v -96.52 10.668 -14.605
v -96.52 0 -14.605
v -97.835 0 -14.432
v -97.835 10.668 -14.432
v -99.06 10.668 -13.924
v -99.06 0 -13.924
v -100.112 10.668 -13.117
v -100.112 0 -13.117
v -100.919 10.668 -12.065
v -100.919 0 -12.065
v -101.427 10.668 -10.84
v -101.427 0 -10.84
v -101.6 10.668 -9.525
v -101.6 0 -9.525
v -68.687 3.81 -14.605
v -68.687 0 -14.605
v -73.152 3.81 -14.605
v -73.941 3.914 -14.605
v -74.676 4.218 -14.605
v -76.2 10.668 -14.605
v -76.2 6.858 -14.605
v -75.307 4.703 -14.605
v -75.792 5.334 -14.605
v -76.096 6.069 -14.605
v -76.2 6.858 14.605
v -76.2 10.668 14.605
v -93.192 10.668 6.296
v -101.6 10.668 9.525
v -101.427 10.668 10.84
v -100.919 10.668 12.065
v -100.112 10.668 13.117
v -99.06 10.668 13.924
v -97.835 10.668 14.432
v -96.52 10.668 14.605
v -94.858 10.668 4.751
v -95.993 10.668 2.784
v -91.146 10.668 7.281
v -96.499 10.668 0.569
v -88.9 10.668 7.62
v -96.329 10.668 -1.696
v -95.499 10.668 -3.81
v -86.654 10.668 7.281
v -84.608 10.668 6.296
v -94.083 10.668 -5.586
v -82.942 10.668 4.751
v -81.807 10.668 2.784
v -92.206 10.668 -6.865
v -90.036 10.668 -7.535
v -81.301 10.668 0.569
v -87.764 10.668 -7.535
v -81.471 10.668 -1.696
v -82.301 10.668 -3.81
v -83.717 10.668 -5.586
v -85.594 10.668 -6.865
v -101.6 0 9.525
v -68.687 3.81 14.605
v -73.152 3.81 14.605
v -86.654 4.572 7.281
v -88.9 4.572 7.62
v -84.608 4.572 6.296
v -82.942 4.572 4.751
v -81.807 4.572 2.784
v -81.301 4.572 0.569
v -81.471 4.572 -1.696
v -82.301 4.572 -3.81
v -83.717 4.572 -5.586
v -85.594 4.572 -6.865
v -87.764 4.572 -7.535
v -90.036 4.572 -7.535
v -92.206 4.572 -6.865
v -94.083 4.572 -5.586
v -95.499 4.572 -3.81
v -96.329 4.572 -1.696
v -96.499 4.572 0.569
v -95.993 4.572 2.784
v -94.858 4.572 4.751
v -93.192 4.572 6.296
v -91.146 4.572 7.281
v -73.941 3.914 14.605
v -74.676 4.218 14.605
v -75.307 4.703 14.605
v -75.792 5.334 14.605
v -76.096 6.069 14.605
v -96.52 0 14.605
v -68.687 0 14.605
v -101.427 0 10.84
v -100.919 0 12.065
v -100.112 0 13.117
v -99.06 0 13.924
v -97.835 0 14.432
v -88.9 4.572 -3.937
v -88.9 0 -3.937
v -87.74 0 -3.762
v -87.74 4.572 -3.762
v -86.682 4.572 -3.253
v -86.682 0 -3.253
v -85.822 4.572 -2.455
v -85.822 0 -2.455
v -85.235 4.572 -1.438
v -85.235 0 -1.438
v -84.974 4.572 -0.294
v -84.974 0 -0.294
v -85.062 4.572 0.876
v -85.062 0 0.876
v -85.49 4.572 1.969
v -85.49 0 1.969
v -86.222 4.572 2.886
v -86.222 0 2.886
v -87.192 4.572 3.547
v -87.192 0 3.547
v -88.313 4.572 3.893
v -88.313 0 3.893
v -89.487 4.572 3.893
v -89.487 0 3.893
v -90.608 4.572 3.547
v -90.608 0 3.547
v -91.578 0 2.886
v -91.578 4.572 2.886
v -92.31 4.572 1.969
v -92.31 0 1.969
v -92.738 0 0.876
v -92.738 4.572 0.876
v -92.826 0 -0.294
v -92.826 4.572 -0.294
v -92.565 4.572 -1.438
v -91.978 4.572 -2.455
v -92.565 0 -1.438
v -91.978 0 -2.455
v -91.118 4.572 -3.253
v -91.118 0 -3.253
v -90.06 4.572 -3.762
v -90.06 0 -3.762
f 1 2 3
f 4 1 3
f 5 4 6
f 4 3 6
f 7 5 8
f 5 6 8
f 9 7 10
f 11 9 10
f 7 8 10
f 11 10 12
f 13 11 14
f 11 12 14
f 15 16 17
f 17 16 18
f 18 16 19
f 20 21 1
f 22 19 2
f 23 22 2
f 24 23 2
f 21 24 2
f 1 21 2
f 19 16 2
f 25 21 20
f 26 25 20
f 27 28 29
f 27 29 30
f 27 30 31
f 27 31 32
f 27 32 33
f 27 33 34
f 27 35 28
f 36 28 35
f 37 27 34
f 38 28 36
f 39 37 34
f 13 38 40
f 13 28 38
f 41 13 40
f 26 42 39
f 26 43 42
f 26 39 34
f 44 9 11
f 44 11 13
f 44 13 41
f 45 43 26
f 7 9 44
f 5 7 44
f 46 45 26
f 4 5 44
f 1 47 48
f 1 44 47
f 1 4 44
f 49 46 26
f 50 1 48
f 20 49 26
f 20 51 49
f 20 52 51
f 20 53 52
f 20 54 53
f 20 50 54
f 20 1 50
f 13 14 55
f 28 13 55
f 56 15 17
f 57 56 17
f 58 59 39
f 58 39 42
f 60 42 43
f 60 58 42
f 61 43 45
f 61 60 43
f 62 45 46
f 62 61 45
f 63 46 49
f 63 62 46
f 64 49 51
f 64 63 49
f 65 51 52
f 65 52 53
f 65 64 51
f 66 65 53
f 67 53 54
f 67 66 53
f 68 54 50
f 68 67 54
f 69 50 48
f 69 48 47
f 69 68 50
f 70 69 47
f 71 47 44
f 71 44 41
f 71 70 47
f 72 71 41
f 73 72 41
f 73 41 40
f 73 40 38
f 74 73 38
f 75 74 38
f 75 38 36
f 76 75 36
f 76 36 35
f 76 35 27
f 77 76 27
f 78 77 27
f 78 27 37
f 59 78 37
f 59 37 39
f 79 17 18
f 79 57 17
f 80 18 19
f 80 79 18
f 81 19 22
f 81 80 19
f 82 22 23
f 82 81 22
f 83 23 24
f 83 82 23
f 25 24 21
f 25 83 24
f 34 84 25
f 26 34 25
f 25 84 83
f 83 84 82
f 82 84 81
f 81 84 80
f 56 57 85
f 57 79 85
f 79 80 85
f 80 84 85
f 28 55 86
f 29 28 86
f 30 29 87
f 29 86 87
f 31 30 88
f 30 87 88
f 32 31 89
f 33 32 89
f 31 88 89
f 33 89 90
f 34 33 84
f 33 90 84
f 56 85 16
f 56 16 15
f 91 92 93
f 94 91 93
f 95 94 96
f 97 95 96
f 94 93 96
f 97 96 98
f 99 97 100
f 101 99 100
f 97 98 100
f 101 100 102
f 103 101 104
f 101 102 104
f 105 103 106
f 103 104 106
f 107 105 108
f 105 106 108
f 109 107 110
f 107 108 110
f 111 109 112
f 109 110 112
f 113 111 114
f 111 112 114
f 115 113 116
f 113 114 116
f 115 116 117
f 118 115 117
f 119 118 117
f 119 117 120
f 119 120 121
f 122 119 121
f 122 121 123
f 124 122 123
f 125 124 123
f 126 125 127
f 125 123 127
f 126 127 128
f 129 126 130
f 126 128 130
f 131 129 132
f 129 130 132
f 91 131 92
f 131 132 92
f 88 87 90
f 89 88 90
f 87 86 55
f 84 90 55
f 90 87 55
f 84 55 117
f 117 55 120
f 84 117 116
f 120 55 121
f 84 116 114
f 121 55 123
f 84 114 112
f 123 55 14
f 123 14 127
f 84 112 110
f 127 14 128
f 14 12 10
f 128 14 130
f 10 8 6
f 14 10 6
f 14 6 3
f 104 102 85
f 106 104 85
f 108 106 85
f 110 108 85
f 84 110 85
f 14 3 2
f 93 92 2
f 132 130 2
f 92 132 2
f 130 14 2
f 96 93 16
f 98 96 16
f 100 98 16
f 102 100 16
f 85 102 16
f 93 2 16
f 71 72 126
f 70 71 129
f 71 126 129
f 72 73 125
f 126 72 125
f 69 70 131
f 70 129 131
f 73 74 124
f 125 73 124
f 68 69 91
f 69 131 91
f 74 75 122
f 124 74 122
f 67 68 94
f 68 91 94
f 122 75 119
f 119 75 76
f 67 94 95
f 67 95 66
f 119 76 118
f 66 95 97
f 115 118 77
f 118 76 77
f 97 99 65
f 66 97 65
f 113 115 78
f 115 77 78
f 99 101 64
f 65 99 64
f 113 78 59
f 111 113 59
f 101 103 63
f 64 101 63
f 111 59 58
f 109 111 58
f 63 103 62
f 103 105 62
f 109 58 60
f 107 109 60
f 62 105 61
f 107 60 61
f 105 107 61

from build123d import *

# Parameters (mm, degrees)
SKETCH1_R                = 13.97
SKETCH1_R_2              = 1.275
BOSS_EXTRUDE1_DEPTH      = 3.048
BOSS_EXTRUDE2_DEPTH      = 7.62
BOSS_EXTRUDE2_DEPTH_BACK = 3.048
SKETCH2_R                = 7.62
SKETCH2_R_2              = 1.275
CUT_EXTRUDE2_DEPTH       = 107.252483849
SKETCH6_R                = 8.89
SKETCH6_R_2              = 3.937
BOSS_EXTRUDE3_DEPTH      = 4.572
FILLET2_R                = 3.048
SKETCH8_W                = 176.271388165
SKETCH8_H                = 26.360341331
CUT_EXTRUDE3_DEPTH       = 107.252483849


with BuildPart() as part:
    # Sketch1 → Boss-Extrude1 (new body)
    with BuildSketch(Plane(origin=(0, 0, 0), x_dir=(1, 0, 0), z_dir=(0, 1, 0))):
        with Locations(Location((0, 0, 0), (0, 0, 90))):
            Circle(SKETCH1_R)
        with Locations(Location((0, 9.5, 0), (0, 0, 90))):
            Circle(SKETCH1_R_2, mode=Mode.SUBTRACT)
        with Locations(Location((9.5, 0, 0), (0, 0, 90))):
            Circle(SKETCH1_R_2, mode=Mode.SUBTRACT)
        with Locations(Location((0, -9.5, 0), (0, 0, 90))):
            Circle(SKETCH1_R_2, mode=Mode.SUBTRACT)
        with Locations(Location((-9.5, 0, 0), (0, 0, 90))):
            Circle(SKETCH1_R_2, mode=Mode.SUBTRACT)
    extrude(amount=BOSS_EXTRUDE1_DEPTH)

    # Sketch2 → Boss-Extrude2 (add, two sides: drawn at the far end of the back side and taken through both)
    with BuildSketch(Plane(origin=(0, 3.048, 0), x_dir=(1, 0, 0), z_dir=(0, 1, 0)).offset(-BOSS_EXTRUDE2_DEPTH_BACK)):
        with BuildLine():
            Line((-96.52, -14.605), (96.52, -14.605))
            ThreePointArc((96.52, -14.605), (100.112102448, -13.117102448), (101.6, -9.525))
            Line((101.6, -9.525), (101.6, 9.525))
            ThreePointArc((101.6, 9.525), (100.112102448, 13.117102448), (96.52, 14.605))
            Line((96.52, 14.605), (-96.52, 14.605))
            ThreePointArc((-96.52, 14.605), (-100.112102448, 13.117102448), (-101.6, 9.525))
            Line((-101.6, 9.525), (-101.6, -9.525))
            ThreePointArc((-101.6, -9.525), (-100.112102448, -13.117102448), (-96.52, -14.605))
        make_face()
        with Locations(Location((-88.9, 0, 0), (0, 0, 270))):
            Circle(SKETCH2_R, mode=Mode.SUBTRACT)
        with Locations(Location((88.9, 0, 0), (0, 0, 270))):
            Circle(SKETCH2_R, mode=Mode.SUBTRACT)
        with Locations(Location((9.5, 0, 0), (0, 0, 90))):
            Circle(SKETCH2_R_2, mode=Mode.SUBTRACT)
        with Locations(Location((0, 9.5, 0), (0, 0, 90))):
            Circle(SKETCH2_R_2, mode=Mode.SUBTRACT)
        with Locations(Location((-9.5, 0, 0), (0, 0, 90))):
            Circle(SKETCH2_R_2, mode=Mode.SUBTRACT)
        with Locations(Location((0, -9.5, 0), (0, 0, 90))):
            Circle(SKETCH2_R_2, mode=Mode.SUBTRACT)
    extrude(amount=BOSS_EXTRUDE2_DEPTH + BOSS_EXTRUDE2_DEPTH_BACK)

    # Sketch5 → Cut-Extrude2 (cut, through all)
    with BuildSketch(Plane(origin=(0, 0, -14.605), x_dir=(-1, 0, 0), z_dir=(0, 0, -1))):
        Polygon((-76.2, 3.81), (0, 3.81), (76.2, 3.81), (76.2, 10.668), (-76.2, 10.668), align=None)
    extrude(amount=-CUT_EXTRUDE2_DEPTH, mode=Mode.SUBTRACT)

    # Sketch6 → Boss-Extrude3 (add)
    # profile 1 of 2: a face of its own
    with BuildSketch(Plane.XZ):
        with Locations((-88.9, 0)):
            Circle(SKETCH6_R)
        with Locations(Location((-88.9, 0, 0), (0, 0, 270))):
            Circle(SKETCH6_R_2, mode=Mode.SUBTRACT)
    # profile 2 of 2: a face of its own
    with BuildSketch(Plane.XZ):
        with Locations((88.9, 0)):
            Circle(SKETCH6_R)
        with Locations(Location((88.9, 0, 0), (0, 0, 270))):
            Circle(SKETCH6_R_2, mode=Mode.SUBTRACT)
    extrude(amount=-BOSS_EXTRUDE3_DEPTH)

    # Fillet2
    fillet2_edges = [part.edges().sort_by_distance(p)[0] for p in [
        (-76.2, 3.81, 0),
        (76.2, 3.81, 0),
    ]]
    fillet(fillet2_edges, radius=FILLET2_R)

    # Sketch8 → Cut-Extrude3 (cut, through all)
    with BuildSketch(Plane.XY.offset(14.605)):
        with Locations((19.448788421, -1.041773615)):
            Rectangle(SKETCH8_W, SKETCH8_H)
    extrude(amount=-CUT_EXTRUDE3_DEPTH, mode=Mode.SUBTRACT)


solid = part.part
